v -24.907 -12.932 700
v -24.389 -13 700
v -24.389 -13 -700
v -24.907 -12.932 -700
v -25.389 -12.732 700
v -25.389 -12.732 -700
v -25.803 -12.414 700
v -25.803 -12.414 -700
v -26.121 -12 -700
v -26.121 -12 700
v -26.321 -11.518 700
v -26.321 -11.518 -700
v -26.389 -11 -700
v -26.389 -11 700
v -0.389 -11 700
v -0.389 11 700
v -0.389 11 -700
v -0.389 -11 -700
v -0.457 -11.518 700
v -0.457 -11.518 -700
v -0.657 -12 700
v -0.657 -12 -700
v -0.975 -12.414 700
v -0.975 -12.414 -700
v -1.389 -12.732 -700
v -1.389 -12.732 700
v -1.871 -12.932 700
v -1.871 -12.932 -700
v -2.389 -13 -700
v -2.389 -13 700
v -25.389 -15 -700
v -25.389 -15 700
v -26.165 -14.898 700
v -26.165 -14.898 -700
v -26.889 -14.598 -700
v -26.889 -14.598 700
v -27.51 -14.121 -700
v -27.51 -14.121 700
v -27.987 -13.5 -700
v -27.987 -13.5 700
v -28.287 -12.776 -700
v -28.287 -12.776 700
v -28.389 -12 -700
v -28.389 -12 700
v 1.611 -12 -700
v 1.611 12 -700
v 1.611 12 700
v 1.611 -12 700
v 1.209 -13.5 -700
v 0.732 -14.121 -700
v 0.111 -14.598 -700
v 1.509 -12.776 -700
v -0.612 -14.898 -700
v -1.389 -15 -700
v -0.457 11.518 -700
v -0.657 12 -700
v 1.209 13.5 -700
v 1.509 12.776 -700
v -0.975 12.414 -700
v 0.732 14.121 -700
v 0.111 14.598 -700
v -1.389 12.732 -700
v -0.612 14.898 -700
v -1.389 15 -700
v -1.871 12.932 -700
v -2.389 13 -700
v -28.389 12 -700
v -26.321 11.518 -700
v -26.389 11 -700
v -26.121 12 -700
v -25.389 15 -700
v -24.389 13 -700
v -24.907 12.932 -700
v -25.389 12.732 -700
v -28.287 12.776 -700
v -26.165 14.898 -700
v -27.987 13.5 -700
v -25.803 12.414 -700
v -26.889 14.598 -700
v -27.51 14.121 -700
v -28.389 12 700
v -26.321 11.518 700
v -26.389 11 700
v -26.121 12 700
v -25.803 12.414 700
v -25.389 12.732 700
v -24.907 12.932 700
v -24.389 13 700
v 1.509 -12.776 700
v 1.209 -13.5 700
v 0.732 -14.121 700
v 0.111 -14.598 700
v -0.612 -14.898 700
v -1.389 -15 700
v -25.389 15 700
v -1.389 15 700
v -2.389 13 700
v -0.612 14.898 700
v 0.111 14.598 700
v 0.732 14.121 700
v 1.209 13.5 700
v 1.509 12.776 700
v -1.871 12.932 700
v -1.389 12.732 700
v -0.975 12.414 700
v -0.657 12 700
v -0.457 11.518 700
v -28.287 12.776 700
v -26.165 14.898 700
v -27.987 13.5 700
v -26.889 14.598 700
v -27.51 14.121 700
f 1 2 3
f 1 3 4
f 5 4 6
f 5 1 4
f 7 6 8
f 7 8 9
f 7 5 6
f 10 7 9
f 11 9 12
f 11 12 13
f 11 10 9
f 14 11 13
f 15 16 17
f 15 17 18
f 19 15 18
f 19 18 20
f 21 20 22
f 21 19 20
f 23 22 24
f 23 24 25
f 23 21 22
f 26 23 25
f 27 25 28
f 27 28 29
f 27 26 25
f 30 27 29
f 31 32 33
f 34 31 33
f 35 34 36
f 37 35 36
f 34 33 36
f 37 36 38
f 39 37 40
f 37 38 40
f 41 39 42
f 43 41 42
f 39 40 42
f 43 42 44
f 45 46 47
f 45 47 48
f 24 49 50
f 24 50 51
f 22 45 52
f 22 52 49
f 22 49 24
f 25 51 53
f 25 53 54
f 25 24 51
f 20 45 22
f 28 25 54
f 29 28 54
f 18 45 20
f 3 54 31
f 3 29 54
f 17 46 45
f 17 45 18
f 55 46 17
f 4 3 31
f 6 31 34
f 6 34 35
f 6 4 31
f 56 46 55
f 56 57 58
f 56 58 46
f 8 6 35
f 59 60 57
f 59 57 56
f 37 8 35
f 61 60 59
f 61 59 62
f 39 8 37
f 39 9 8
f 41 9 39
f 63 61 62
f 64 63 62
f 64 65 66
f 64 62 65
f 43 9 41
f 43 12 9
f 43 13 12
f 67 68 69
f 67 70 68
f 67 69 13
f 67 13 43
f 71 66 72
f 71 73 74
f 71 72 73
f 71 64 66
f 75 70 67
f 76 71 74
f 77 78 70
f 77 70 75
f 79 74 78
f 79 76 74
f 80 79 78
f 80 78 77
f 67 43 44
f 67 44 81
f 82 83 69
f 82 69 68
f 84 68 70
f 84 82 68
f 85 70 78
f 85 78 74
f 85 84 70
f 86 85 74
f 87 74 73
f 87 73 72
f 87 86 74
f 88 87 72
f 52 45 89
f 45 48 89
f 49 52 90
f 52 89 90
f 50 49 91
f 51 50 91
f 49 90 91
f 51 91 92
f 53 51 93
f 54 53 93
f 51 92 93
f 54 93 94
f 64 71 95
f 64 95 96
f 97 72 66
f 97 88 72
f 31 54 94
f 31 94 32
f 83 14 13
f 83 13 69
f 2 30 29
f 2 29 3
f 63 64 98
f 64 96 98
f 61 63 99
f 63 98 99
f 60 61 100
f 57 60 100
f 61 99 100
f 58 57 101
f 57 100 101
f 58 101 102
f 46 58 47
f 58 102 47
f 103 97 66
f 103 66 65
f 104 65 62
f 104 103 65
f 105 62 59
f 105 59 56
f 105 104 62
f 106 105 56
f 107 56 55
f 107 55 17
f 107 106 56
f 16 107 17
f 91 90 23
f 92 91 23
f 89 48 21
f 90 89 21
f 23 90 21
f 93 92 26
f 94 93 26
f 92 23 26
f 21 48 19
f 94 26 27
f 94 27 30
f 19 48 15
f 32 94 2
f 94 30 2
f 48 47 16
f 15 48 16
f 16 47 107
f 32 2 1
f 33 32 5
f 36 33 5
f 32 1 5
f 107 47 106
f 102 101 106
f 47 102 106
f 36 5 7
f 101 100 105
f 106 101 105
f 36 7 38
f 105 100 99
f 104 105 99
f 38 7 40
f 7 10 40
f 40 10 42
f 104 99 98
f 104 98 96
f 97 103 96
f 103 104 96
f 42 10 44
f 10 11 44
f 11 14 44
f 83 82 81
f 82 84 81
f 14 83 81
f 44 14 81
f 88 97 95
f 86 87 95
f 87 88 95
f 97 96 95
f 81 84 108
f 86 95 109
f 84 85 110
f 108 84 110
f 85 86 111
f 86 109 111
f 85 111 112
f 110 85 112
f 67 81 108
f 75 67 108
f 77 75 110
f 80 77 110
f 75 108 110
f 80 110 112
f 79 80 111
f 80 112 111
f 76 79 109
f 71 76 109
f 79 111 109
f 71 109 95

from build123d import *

# Parameters (mm, degrees)
EXTRUDE_1_DEPTH = 700


with BuildPart() as part:
    # Эскиз1 → Бобышка-Вытянуть1 (new body)
    with BuildSketch(Plane.XY):
        with BuildLine():
            Line((-25.388920969, 15), (-1.388920969, 15))
            ThreePointArc((-1.388920969, 15), (0.732399375, 14.121320344), (1.611079031, 12))
            Line((1.611079031, 12), (1.611079031, -12))
            ThreePointArc((1.611079031, -12), (0.732399375, -14.121320344), (-1.388920969, -15))
            Line((-1.388920969, -15), (-25.388920969, -15))
            ThreePointArc((-25.388920969, -15), (-27.510241313, -14.121320344), (-28.388920969, -12))
            Line((-28.388920969, -12), (-28.388920969, 12))
            ThreePointArc((-28.388920969, 12), (-27.510241313, 14.121320344), (-25.388920969, 15))
        make_face()
        with BuildLine():
            Line((-24.388920969, 13), (-2.388920969, 13))
            ThreePointArc((-2.388920969, 13), (-0.974707407, 12.414213562), (-0.388920969, 11))
            Line((-0.388920969, 11), (-0.388920969, -11))
            ThreePointArc((-0.388920969, -11), (-0.974707407, -12.414213562), (-2.388920969, -13))
            Line((-2.388920969, -13), (-24.388920969, -13))
            ThreePointArc((-24.388920969, -13), (-25.803134531, -12.414213562), (-26.388920969, -11))
            Line((-26.388920969, -11), (-26.388920969, 11))
            ThreePointArc((-26.388920969, 11), (-25.803134531, 12.414213562), (-24.388920969, 13))
        make_face(mode=Mode.SUBTRACT)
    extrude(amount=EXTRUDE_1_DEPTH)

    # Зеркальное отражение1: part across plane


with BuildPart() as part_1:
    add(part.part)
    add(part.part.mirror(Plane(origin=(-25.388920969, -12, 0), x_dir=(1, 0, 0), z_dir=(0, 0, 1))))


solid = part_1.part
